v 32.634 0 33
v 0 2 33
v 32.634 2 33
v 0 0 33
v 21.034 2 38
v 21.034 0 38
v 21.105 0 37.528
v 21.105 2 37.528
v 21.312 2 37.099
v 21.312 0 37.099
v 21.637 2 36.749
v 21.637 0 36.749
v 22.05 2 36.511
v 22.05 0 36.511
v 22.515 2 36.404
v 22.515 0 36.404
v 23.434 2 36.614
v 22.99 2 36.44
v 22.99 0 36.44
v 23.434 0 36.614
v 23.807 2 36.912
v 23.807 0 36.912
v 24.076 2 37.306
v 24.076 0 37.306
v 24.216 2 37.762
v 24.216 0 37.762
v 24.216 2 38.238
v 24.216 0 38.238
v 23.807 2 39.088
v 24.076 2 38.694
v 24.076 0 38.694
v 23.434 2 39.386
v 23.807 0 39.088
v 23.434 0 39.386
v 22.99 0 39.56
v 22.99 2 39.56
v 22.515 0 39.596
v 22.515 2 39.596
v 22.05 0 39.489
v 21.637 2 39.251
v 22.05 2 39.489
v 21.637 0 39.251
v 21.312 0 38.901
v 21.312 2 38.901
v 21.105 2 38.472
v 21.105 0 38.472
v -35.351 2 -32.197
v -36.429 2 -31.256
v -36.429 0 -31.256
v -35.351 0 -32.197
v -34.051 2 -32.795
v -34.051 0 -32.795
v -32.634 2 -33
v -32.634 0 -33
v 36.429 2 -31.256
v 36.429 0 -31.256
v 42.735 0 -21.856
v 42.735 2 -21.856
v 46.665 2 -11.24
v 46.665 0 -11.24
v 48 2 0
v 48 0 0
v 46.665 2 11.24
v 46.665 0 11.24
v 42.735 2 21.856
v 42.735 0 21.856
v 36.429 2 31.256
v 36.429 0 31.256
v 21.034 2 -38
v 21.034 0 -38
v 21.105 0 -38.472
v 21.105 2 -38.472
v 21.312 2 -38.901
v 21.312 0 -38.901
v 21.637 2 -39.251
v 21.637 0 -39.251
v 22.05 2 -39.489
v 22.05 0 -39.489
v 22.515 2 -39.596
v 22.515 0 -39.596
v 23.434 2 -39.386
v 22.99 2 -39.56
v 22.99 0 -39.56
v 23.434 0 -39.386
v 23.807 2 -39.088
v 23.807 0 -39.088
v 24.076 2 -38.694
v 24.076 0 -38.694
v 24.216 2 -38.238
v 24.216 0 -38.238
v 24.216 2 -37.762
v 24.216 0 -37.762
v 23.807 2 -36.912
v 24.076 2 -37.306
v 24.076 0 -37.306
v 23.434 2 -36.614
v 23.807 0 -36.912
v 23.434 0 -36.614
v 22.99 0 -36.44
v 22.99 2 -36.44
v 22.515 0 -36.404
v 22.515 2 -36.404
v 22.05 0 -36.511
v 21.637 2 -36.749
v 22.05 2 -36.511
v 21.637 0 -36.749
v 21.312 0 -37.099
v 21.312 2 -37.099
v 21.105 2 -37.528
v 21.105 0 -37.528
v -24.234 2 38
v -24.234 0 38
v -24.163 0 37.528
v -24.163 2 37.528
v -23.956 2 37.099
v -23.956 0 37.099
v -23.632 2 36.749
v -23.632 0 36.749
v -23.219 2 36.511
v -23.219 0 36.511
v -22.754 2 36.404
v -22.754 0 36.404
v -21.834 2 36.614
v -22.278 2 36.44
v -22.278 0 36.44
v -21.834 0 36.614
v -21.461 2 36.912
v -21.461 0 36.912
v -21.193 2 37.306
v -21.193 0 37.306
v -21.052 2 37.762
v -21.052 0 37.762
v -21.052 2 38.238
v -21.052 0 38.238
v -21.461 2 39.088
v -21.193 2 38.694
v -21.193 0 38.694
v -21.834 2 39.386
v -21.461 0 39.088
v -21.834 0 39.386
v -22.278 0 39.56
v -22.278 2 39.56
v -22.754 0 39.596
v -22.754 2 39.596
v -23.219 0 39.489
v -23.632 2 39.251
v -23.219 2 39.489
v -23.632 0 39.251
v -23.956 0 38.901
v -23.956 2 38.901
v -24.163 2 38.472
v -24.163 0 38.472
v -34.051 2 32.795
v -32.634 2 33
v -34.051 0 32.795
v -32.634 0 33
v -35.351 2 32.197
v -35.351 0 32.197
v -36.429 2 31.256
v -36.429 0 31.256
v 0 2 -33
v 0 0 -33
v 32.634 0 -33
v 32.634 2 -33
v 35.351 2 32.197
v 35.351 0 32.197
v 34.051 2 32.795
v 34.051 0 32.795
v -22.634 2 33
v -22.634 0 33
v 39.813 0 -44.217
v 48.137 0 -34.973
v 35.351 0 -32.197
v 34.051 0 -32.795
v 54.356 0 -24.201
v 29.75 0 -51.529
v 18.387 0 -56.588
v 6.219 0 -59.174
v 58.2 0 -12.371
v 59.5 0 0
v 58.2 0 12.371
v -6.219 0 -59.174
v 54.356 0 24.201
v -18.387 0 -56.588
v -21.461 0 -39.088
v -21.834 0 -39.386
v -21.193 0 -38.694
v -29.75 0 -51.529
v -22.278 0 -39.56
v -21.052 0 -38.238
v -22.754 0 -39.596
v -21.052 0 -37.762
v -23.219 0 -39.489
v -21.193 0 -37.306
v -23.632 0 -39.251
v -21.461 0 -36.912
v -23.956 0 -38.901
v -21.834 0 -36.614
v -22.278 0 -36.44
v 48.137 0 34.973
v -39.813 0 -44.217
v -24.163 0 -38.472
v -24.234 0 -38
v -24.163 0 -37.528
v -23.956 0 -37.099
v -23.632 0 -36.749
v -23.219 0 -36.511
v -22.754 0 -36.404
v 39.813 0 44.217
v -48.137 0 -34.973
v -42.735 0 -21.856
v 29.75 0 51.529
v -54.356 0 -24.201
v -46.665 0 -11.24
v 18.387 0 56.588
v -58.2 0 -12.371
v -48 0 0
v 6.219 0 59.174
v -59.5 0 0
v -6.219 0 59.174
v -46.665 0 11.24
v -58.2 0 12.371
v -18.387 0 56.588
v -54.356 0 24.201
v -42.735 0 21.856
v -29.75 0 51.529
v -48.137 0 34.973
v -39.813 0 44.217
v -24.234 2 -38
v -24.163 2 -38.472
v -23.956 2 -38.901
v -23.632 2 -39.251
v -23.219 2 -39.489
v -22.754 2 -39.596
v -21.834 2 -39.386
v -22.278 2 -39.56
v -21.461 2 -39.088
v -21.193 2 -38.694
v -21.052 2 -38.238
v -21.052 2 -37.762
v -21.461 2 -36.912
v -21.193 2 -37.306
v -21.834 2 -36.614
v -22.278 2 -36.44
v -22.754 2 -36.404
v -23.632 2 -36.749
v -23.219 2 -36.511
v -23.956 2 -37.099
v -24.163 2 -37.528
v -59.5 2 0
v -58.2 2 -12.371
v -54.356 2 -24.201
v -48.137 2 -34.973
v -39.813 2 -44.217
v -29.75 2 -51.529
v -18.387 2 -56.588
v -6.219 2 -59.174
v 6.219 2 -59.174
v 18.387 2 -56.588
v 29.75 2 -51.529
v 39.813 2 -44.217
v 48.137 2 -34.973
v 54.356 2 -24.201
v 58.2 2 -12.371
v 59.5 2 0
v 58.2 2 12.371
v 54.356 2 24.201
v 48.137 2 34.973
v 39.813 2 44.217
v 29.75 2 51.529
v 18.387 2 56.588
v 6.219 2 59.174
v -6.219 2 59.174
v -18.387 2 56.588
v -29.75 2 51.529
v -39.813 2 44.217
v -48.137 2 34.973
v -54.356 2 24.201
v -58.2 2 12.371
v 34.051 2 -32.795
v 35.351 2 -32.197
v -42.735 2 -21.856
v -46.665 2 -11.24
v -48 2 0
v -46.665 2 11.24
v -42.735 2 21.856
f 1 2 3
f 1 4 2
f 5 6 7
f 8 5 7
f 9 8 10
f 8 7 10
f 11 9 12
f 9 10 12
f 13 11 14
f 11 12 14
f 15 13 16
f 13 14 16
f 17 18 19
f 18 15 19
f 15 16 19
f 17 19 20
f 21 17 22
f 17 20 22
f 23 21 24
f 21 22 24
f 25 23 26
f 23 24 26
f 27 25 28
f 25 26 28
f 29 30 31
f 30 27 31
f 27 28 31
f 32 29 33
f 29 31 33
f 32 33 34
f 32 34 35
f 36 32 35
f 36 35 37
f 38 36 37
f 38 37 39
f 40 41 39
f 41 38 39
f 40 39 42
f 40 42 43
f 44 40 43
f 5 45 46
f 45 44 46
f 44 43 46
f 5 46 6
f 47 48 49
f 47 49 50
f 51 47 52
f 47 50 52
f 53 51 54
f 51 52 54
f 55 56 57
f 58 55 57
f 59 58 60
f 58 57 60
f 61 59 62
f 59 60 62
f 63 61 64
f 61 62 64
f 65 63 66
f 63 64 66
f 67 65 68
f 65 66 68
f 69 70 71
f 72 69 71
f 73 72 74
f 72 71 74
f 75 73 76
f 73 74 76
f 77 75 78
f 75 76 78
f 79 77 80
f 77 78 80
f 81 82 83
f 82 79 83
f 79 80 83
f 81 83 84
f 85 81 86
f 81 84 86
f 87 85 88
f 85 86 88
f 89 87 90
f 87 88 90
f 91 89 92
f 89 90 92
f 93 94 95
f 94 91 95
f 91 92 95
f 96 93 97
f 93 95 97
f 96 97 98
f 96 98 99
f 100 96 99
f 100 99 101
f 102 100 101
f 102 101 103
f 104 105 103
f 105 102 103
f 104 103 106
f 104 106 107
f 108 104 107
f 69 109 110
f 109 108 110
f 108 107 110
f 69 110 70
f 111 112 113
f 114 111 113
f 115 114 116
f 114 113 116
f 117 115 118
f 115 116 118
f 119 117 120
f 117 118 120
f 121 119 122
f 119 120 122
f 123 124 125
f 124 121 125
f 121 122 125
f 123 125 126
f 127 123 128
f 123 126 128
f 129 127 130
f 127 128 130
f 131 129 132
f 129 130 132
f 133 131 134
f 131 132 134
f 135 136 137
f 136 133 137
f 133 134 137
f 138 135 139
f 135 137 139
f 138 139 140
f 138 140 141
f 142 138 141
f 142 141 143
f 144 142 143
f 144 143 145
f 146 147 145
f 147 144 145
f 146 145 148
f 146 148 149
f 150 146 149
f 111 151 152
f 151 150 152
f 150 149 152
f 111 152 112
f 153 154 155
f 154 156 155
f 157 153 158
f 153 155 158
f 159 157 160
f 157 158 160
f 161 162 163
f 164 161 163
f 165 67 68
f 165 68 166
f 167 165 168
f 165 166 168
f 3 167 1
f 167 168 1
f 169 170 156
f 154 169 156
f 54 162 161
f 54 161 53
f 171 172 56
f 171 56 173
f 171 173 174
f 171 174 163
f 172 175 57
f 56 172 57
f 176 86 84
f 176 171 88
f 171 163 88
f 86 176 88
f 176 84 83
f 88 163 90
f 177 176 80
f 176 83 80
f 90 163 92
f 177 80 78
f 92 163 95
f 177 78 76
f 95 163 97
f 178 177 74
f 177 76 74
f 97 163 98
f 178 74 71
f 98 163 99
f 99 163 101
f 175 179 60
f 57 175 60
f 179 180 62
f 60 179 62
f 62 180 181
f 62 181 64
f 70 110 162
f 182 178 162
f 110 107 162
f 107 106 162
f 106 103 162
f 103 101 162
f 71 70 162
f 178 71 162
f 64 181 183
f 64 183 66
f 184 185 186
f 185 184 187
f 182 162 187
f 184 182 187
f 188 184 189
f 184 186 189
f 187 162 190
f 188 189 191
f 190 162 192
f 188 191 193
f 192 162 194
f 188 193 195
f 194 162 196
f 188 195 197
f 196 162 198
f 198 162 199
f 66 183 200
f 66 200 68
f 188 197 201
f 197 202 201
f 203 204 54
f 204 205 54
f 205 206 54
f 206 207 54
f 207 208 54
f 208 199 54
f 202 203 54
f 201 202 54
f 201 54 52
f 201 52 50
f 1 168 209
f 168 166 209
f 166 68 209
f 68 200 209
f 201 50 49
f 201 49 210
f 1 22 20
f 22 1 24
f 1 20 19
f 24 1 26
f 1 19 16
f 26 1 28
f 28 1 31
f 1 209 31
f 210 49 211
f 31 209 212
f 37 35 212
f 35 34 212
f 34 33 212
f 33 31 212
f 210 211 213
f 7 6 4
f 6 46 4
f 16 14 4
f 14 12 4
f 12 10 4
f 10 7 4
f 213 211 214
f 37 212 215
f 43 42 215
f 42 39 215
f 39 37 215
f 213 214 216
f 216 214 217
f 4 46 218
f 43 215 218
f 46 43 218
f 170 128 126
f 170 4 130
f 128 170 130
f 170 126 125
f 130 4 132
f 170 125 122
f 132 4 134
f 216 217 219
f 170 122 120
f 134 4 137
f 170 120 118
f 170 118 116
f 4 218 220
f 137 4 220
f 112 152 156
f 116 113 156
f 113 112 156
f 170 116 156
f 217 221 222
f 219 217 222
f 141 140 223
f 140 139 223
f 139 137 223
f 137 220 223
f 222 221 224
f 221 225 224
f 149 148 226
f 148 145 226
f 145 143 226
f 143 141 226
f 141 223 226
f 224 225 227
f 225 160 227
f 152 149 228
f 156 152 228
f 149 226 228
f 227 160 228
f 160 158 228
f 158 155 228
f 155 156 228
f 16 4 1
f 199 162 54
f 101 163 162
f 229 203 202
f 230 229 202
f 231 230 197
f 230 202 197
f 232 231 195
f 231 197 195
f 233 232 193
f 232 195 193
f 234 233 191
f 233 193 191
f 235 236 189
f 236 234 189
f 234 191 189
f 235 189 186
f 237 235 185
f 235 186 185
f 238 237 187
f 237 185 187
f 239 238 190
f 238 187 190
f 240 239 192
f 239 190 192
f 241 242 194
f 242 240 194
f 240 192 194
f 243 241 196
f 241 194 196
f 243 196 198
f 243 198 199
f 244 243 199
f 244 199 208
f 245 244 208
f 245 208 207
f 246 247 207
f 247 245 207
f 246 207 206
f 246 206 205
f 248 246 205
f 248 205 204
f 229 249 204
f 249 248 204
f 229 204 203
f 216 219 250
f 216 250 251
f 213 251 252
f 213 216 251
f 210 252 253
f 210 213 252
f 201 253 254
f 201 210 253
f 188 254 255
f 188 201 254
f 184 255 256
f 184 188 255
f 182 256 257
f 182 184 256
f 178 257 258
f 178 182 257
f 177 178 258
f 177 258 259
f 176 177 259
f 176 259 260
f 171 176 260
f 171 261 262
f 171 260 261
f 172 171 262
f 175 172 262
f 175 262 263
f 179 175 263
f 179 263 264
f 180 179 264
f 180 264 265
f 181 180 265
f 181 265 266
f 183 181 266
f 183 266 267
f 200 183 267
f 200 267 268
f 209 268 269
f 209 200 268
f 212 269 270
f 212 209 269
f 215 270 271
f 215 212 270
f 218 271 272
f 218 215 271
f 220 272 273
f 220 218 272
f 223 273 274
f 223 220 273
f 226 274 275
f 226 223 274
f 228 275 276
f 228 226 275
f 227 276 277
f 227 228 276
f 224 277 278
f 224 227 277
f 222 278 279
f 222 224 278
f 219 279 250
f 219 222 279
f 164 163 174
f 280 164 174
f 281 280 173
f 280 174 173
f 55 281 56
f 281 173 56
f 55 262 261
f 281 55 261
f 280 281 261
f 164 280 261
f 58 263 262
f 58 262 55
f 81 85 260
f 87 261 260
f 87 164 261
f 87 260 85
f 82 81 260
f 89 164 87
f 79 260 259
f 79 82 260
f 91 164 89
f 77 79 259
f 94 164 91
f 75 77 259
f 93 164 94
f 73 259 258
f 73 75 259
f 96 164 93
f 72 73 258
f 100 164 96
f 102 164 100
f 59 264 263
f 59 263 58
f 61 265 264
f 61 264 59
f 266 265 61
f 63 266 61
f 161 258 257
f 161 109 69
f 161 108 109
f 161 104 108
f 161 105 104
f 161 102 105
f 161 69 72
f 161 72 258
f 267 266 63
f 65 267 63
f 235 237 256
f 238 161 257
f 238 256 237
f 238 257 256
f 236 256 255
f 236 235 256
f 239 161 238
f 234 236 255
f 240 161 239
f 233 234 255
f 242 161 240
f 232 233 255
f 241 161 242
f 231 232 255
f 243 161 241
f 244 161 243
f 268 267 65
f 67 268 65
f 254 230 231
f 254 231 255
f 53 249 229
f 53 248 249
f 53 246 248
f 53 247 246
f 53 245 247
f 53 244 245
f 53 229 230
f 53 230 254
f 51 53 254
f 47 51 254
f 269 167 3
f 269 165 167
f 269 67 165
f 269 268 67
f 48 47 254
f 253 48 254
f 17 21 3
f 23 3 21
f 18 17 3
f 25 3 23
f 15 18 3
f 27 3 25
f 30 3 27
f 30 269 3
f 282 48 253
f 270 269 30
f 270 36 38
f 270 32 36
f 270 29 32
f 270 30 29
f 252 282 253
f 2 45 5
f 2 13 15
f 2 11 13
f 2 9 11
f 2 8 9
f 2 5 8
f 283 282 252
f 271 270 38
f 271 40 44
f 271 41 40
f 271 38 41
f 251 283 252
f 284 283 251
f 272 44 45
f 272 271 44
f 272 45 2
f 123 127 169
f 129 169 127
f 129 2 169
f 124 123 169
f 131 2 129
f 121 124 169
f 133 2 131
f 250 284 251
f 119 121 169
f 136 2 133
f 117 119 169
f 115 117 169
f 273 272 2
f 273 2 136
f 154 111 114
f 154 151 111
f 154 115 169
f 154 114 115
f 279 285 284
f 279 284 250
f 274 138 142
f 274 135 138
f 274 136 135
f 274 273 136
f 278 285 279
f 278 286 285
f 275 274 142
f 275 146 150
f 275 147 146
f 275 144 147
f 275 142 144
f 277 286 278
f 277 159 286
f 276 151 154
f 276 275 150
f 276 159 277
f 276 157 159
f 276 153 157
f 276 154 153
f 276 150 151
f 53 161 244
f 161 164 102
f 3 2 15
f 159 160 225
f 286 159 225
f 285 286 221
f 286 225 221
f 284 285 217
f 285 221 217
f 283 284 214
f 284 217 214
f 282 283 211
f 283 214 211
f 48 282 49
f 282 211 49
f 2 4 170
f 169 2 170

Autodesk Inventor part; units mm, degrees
ref_plane "YZ Plane" through (0, 0, 0) normal (1, 0, 0) x (0, 1, 0)
ref_plane "XZ Plane" through (0, 0, 0) normal (0, 1, 0) x (-1, 0, 0)
ref_plane "XY Plane" through (0, 0, 0) normal (0, 0, 1) x (1, 0, 0)
sketch "Sketch1" plane through (0, 0, 0) normal (0, 1, 0) x (-1, 0, 0)
  circle A0 centre (0, 0) radius 59.5
  line L0 (0, 33) -> (-32.6343, 33)
  line L1 (0, 33) -> (32.6343, 33)
  line L2 (0, -33) -> (-32.6343, -33)
  line L3 (0, -33) -> (32.6343, -33)
  arc A1 (-36.429, 31.2558) -> (-36.429, -31.2558) centre (0, 0) ccw
  arc A2 (36.429, -31.2558) -> (36.429, 31.2558) centre (0, 0) ccw
  arc A3 (36.429, 31.2558) -> (32.6343, 33) centre (32.6343, 28) ccw
  arc A4 (-32.6343, 33) -> (-36.429, 31.2558) centre (-32.6343, 28) ccw
  arc A5 (-36.429, -31.2558) -> (-32.6343, -33) centre (-32.6343, -28) ccw
  arc A6 (32.6343, -33) -> (36.429, -31.2558) centre (32.6343, -28) ccw
  line L4 (32.6343, 33) -> (22.6343, 33)
  circle A7 centre (22.6343, 38) radius 1.6
  line L5 (0, 0) -> (0, 10.7969)
  line L6 (0, 0) -> (10.7386, 0)
  circle A8 centre (-22.6343, 38) radius 1.6
  circle A9 centre (22.6343, -38) radius 1.6
  circle A10 centre (-22.6343, -38) radius 1.6
  point P0 (-34.8569, 33)
  point P1 (34.8569, 33)
  point P2 (-34.8569, -33)
  point P3 (34.8569, -33)
  dimension "d1" = 119
  dimension "d7" = 5
  dimension "d8" = 10
  dimension "d11" = 3.2
extrude "Extrusion1" add sketch "Sketch1" along normal blind 2
sketch "Sketch2" plane through (0, 0, 0) normal (0, -1, 0) x (1, 0, 0)
  line L0 (1.5, -53.75) -> (1.5, -56.75)
  line L1 (1.5, -56.75) -> (4.5, -56.75)
  line L2 (4.5, -56.75) -> (4.5, -50.75)
  line L3 (4.5, -50.75) -> (1.5, -50.75)
  line L4 (1.5, -50.75) -> (1.5, -53.75)
  line L5 (-1.5, -53.75) -> (-1.5, -56.75)
  line L6 (-1.5, -56.75) -> (-4.5, -56.75)
  line L7 (-1.5, -53.75) -> (-1.5, -53.75)
  line L8 (-1.5, -53.75) -> (-1.5, -50.75)
  line L9 (-1.5, -50.75) -> (-4.5, -50.75)
  line L10 (-4.5, -56.75) -> (-4.5, -50.75)
  line L11 (17.4817, -47.856) -> (14.584, -48.6325)
  line L12 (11.6862, -49.409) -> (8.7884, -50.1854)
  line L13 (12.4626, -52.3067) -> (11.6862, -49.409)
  line L14 (10.3413, -55.981) -> (8.7884, -50.1854)
  line L15 (14.584, -48.6325) -> (15.3604, -51.5303)
  line L16 (19.0346, -53.6516) -> (17.4817, -47.856)
  line L17 (16.1369, -54.4281) -> (19.0346, -53.6516)
  line L18 (15.3604, -51.5303) -> (16.1369, -54.4281)
  line L19 (12.4626, -52.3067) -> (13.2391, -55.2045)
  line L20 (13.2391, -55.2045) -> (10.3413, -55.981)
  line L21 (29.2721, -41.7008) -> (26.674, -43.2008)
  line L22 (24.076, -44.7008) -> (21.4779, -46.2008)
  line L23 (25.576, -47.2989) -> (24.076, -44.7008)
  line L24 (24.4779, -51.3969) -> (21.4779, -46.2008)
  line L25 (26.674, -43.2008) -> (28.174, -45.7989)
  line L26 (32.2721, -46.8969) -> (29.2721, -41.7008)
  line L27 (29.674, -48.3969) -> (32.2721, -46.8969)
  line L28 (28.174, -45.7989) -> (29.674, -48.3969)
  line L29 (25.576, -47.2989) -> (27.076, -49.8969)
  line L30 (27.076, -49.8969) -> (24.4779, -51.3969)
  line L31 (39.0676, -32.7037) -> (36.9463, -34.825)
  line L32 (34.825, -36.9463) -> (32.7037, -39.0676)
  line L33 (36.9463, -39.0676) -> (34.825, -36.9463)
  line L34 (36.9463, -43.3103) -> (32.7037, -39.0676)
  line L35 (36.9463, -34.825) -> (39.0676, -36.9463)
  line L36 (43.3103, -36.9463) -> (39.0676, -32.7037)
  line L37 (41.189, -39.0676) -> (43.3103, -36.9463)
  line L38 (39.0676, -36.9463) -> (41.189, -39.0676)
  line L39 (36.9463, -39.0676) -> (39.0676, -41.189)
  line L40 (39.0676, -41.189) -> (36.9463, -43.3103)
  line L41 (46.2008, -21.4779) -> (44.7008, -24.076)
  line L42 (43.2008, -26.674) -> (41.7008, -29.2721)
  line L43 (45.7989, -28.174) -> (43.2008, -26.674)
  line L44 (46.8969, -32.2721) -> (41.7008, -29.2721)
  line L45 (44.7008, -24.076) -> (47.2989, -25.576)
  line L46 (51.3969, -24.4779) -> (46.2008, -21.4779)
  line L47 (49.8969, -27.076) -> (51.3969, -24.4779)
  line L48 (47.2989, -25.576) -> (49.8969, -27.076)
  line L49 (45.7989, -28.174) -> (48.3969, -29.674)
  line L50 (48.3969, -29.674) -> (46.8969, -32.2721)
  line L51 (50.1854, -8.7884) -> (49.409, -11.6862)
  line L52 (48.6325, -14.584) -> (47.856, -17.4817)
  line L53 (51.5303, -15.3604) -> (48.6325, -14.584)
  line L54 (53.6516, -19.0346) -> (47.856, -17.4817)
  line L55 (49.409, -11.6862) -> (52.3067, -12.4626)
  line L56 (55.981, -10.3413) -> (50.1854, -8.7884)
  line L57 (55.2045, -13.2391) -> (55.981, -10.3413)
  line L58 (52.3067, -12.4626) -> (55.2045, -13.2391)
  line L59 (51.5303, -15.3604) -> (54.4281, -16.1369)
  line L60 (54.4281, -16.1369) -> (53.6516, -19.0346)
  line L61 (50.75, 4.5) -> (50.75, 1.5)
  line L62 (50.75, -1.5) -> (50.75, -4.5)
  line L63 (53.75, -1.5) -> (50.75, -1.5)
  line L64 (56.75, -4.5) -> (50.75, -4.5)
  line L65 (50.75, 1.5) -> (53.75, 1.5)
  line L66 (56.75, 4.5) -> (50.75, 4.5)
  line L67 (56.75, 1.5) -> (56.75, 4.5)
  line L68 (53.75, 1.5) -> (56.75, 1.5)
  line L69 (53.75, -1.5) -> (56.75, -1.5)
  line L70 (56.75, -1.5) -> (56.75, -4.5)
  line L71 (47.856, 17.4817) -> (48.6325, 14.584)
  line L72 (49.409, 11.6862) -> (50.1854, 8.7884)
  line L73 (52.3067, 12.4626) -> (49.409, 11.6862)
  line L74 (55.981, 10.3413) -> (50.1854, 8.7884)
  line L75 (48.6325, 14.584) -> (51.5303, 15.3604)
  line L76 (53.6516, 19.0346) -> (47.856, 17.4817)
  line L77 (54.4281, 16.1369) -> (53.6516, 19.0346)
  line L78 (51.5303, 15.3604) -> (54.4281, 16.1369)
  line L79 (52.3067, 12.4626) -> (55.2045, 13.2391)
  line L80 (55.2045, 13.2391) -> (55.981, 10.3413)
  line L81 (41.7008, 29.2721) -> (43.2008, 26.674)
  line L82 (44.7008, 24.076) -> (46.2008, 21.4779)
  line L83 (47.2989, 25.576) -> (44.7008, 24.076)
  line L84 (51.3969, 24.4779) -> (46.2008, 21.4779)
  line L85 (43.2008, 26.674) -> (45.7989, 28.174)
  line L86 (46.8969, 32.2721) -> (41.7008, 29.2721)
  line L87 (48.3969, 29.674) -> (46.8969, 32.2721)
  line L88 (45.7989, 28.174) -> (48.3969, 29.674)
  line L89 (47.2989, 25.576) -> (49.8969, 27.076)
  line L90 (49.8969, 27.076) -> (51.3969, 24.4779)
  line L91 (32.7037, 39.0676) -> (34.825, 36.9463)
  line L92 (36.9463, 34.825) -> (39.0676, 32.7037)
  line L93 (39.0676, 36.9463) -> (36.9463, 34.825)
  line L94 (43.3103, 36.9463) -> (39.0676, 32.7037)
  line L95 (34.825, 36.9463) -> (36.9463, 39.0676)
  line L96 (36.9463, 43.3103) -> (32.7037, 39.0676)
  line L97 (39.0676, 41.189) -> (36.9463, 43.3103)
  line L98 (36.9463, 39.0676) -> (39.0676, 41.189)
  line L99 (39.0676, 36.9463) -> (41.189, 39.0676)
  line L100 (41.189, 39.0676) -> (43.3103, 36.9463)
  line L101 (21.4779, 46.2008) -> (24.076, 44.7008)
  line L102 (26.674, 43.2008) -> (29.2721, 41.7008)
  line L103 (28.174, 45.7989) -> (26.674, 43.2008)
  line L104 (32.2721, 46.8969) -> (29.2721, 41.7008)
  line L105 (24.076, 44.7008) -> (25.576, 47.2989)
  line L106 (24.4779, 51.3969) -> (21.4779, 46.2008)
  line L107 (27.076, 49.8969) -> (24.4779, 51.3969)
  line L108 (25.576, 47.2989) -> (27.076, 49.8969)
  line L109 (28.174, 45.7989) -> (29.674, 48.3969)
  line L110 (29.674, 48.3969) -> (32.2721, 46.8969)
  line L111 (8.7884, 50.1854) -> (11.6862, 49.409)
  line L112 (14.584, 48.6325) -> (17.4817, 47.856)
  line L113 (15.3604, 51.5303) -> (14.584, 48.6325)
  line L114 (19.0346, 53.6516) -> (17.4817, 47.856)
  line L115 (11.6862, 49.409) -> (12.4626, 52.3067)
  line L116 (10.3413, 55.981) -> (8.7884, 50.1854)
  line L117 (13.2391, 55.2045) -> (10.3413, 55.981)
  line L118 (12.4626, 52.3067) -> (13.2391, 55.2045)
  line L119 (15.3604, 51.5303) -> (16.1369, 54.4281)
  line L120 (16.1369, 54.4281) -> (19.0346, 53.6516)
  line L121 (-4.5, 50.75) -> (-1.5, 50.75)
  line L122 (1.5, 50.75) -> (4.5, 50.75)
  line L123 (1.5, 53.75) -> (1.5, 50.75)
  line L124 (4.5, 56.75) -> (4.5, 50.75)
  line L125 (-1.5, 50.75) -> (-1.5, 53.75)
  line L126 (-4.5, 56.75) -> (-4.5, 50.75)
  line L127 (-1.5, 56.75) -> (-4.5, 56.75)
  line L128 (-1.5, 53.75) -> (-1.5, 56.75)
  line L129 (1.5, 53.75) -> (1.5, 56.75)
  line L130 (1.5, 56.75) -> (4.5, 56.75)
  line L131 (-17.4817, 47.856) -> (-14.584, 48.6325)
  line L132 (-11.6862, 49.409) -> (-8.7884, 50.1854)
  line L133 (-12.4626, 52.3067) -> (-11.6862, 49.409)
  line L134 (-10.3413, 55.981) -> (-8.7884, 50.1854)
  line L135 (-14.584, 48.6325) -> (-15.3604, 51.5303)
  line L136 (-19.0346, 53.6516) -> (-17.4817, 47.856)
  line L137 (-16.1369, 54.4281) -> (-19.0346, 53.6516)
  line L138 (-15.3604, 51.5303) -> (-16.1369, 54.4281)
  line L139 (-12.4626, 52.3067) -> (-13.2391, 55.2045)
  line L140 (-13.2391, 55.2045) -> (-10.3413, 55.981)
  line L141 (-29.2721, 41.7008) -> (-26.674, 43.2008)
  line L142 (-24.076, 44.7008) -> (-21.4779, 46.2008)
  line L143 (-25.576, 47.2989) -> (-24.076, 44.7008)
  line L144 (-24.4779, 51.3969) -> (-21.4779, 46.2008)
  line L145 (-26.674, 43.2008) -> (-28.174, 45.7989)
  line L146 (-32.2721, 46.8969) -> (-29.2721, 41.7008)
  line L147 (-29.674, 48.3969) -> (-32.2721, 46.8969)
  line L148 (-28.174, 45.7989) -> (-29.674, 48.3969)
  line L149 (-25.576, 47.2989) -> (-27.076, 49.8969)
  line L150 (-27.076, 49.8969) -> (-24.4779, 51.3969)
  line L151 (-39.0676, 32.7037) -> (-36.9463, 34.825)
  line L152 (-34.825, 36.9463) -> (-32.7037, 39.0676)
  line L153 (-36.9463, 39.0676) -> (-34.825, 36.9463)
  line L154 (-36.9463, 43.3103) -> (-32.7037, 39.0676)
  line L155 (-36.9463, 34.825) -> (-39.0676, 36.9463)
  line L156 (-43.3103, 36.9463) -> (-39.0676, 32.7037)
  line L157 (-41.189, 39.0676) -> (-43.3103, 36.9463)
  line L158 (-39.0676, 36.9463) -> (-41.189, 39.0676)
  line L159 (-36.9463, 39.0676) -> (-39.0676, 41.189)
  line L160 (-39.0676, 41.189) -> (-36.9463, 43.3103)
  line L161 (-46.2008, 21.4779) -> (-44.7008, 24.076)
  line L162 (-43.2008, 26.674) -> (-41.7008, 29.2721)
  line L163 (-45.7989, 28.174) -> (-43.2008, 26.674)
  line L164 (-46.8969, 32.2721) -> (-41.7008, 29.2721)
  line L165 (-44.7008, 24.076) -> (-47.2989, 25.576)
  line L166 (-51.3969, 24.4779) -> (-46.2008, 21.4779)
  line L167 (-49.8969, 27.076) -> (-51.3969, 24.4779)
  line L168 (-47.2989, 25.576) -> (-49.8969, 27.076)
  line L169 (-45.7989, 28.174) -> (-48.3969, 29.674)
  line L170 (-48.3969, 29.674) -> (-46.8969, 32.2721)
  line L171 (-50.1854, 8.7884) -> (-49.409, 11.6862)
  line L172 (-48.6325, 14.584) -> (-47.856, 17.4817)
  line L173 (-51.5303, 15.3604) -> (-48.6325, 14.584)
  line L174 (-53.6516, 19.0346) -> (-47.856, 17.4817)
  line L175 (-49.409, 11.6862) -> (-52.3067, 12.4626)
  line L176 (-55.981, 10.3413) -> (-50.1854, 8.7884)
  line L177 (-55.2045, 13.2391) -> (-55.981, 10.3413)
  line L178 (-52.3067, 12.4626) -> (-55.2045, 13.2391)
  line L179 (-51.5303, 15.3604) -> (-54.4281, 16.1369)
  line L180 (-54.4281, 16.1369) -> (-53.6516, 19.0346)
  line L181 (-50.75, -4.5) -> (-50.75, -1.5)
  line L182 (-50.75, 1.5) -> (-50.75, 4.5)
  line L183 (-53.75, 1.5) -> (-50.75, 1.5)
  line L184 (-56.75, 4.5) -> (-50.75, 4.5)
  line L185 (-50.75, -1.5) -> (-53.75, -1.5)
  line L186 (-56.75, -4.5) -> (-50.75, -4.5)
  line L187 (-56.75, -1.5) -> (-56.75, -4.5)
  line L188 (-53.75, -1.5) -> (-56.75, -1.5)
  line L189 (-53.75, 1.5) -> (-56.75, 1.5)
  line L190 (-56.75, 1.5) -> (-56.75, 4.5)
  line L191 (-47.856, -17.4817) -> (-48.6325, -14.584)
  line L192 (-49.409, -11.6862) -> (-50.1854, -8.7884)
  line L193 (-52.3067, -12.4626) -> (-49.409, -11.6862)
  line L194 (-55.981, -10.3413) -> (-50.1854, -8.7884)
  line L195 (-48.6325, -14.584) -> (-51.5303, -15.3604)
  line L196 (-53.6516, -19.0346) -> (-47.856, -17.4817)
  line L197 (-54.4281, -16.1369) -> (-53.6516, -19.0346)
  line L198 (-51.5303, -15.3604) -> (-54.4281, -16.1369)
  line L199 (-52.3067, -12.4626) -> (-55.2045, -13.2391)
  line L200 (-55.2045, -13.2391) -> (-55.981, -10.3413)
  line L201 (-41.7008, -29.2721) -> (-43.2008, -26.674)
  line L202 (-44.7008, -24.076) -> (-46.2008, -21.4779)
  line L203 (-47.2989, -25.576) -> (-44.7008, -24.076)
  line L204 (-51.3969, -24.4779) -> (-46.2008, -21.4779)
  line L205 (-43.2008, -26.674) -> (-45.7989, -28.174)
  line L206 (-46.8969, -32.2721) -> (-41.7008, -29.2721)
  line L207 (-48.3969, -29.674) -> (-46.8969, -32.2721)
  line L208 (-45.7989, -28.174) -> (-48.3969, -29.674)
  line L209 (-47.2989, -25.576) -> (-49.8969, -27.076)
  line L210 (-49.8969, -27.076) -> (-51.3969, -24.4779)
  line L211 (-32.7037, -39.0676) -> (-34.825, -36.9463)
  line L212 (-36.9463, -34.825) -> (-39.0676, -32.7037)
  line L213 (-39.0676, -36.9463) -> (-36.9463, -34.825)
  line L214 (-43.3103, -36.9463) -> (-39.0676, -32.7037)
  line L215 (-34.825, -36.9463) -> (-36.9463, -39.0676)
  line L216 (-36.9463, -43.3103) -> (-32.7037, -39.0676)
  line L217 (-39.0676, -41.189) -> (-36.9463, -43.3103)
  line L218 (-36.9463, -39.0676) -> (-39.0676, -41.189)
  line L219 (-39.0676, -36.9463) -> (-41.189, -39.0676)
  line L220 (-41.189, -39.0676) -> (-43.3103, -36.9463)
  line L221 (-21.4779, -46.2008) -> (-24.076, -44.7008)
  line L222 (-26.674, -43.2008) -> (-29.2721, -41.7008)
  line L223 (-28.174, -45.7989) -> (-26.674, -43.2008)
  line L224 (-32.2721, -46.8969) -> (-29.2721, -41.7008)
  line L225 (-24.076, -44.7008) -> (-25.576, -47.2989)
  line L226 (-24.4779, -51.3969) -> (-21.4779, -46.2008)
  line L227 (-27.076, -49.8969) -> (-24.4779, -51.3969)
  line L228 (-25.576, -47.2989) -> (-27.076, -49.8969)
  line L229 (-28.174, -45.7989) -> (-29.674, -48.3969)
  line L230 (-29.674, -48.3969) -> (-32.2721, -46.8969)
  line L231 (-8.7884, -50.1854) -> (-11.6862, -49.409)
  line L232 (-14.584, -48.6325) -> (-17.4817, -47.856)
  line L233 (-15.3604, -51.5303) -> (-14.584, -48.6325)
  line L234 (-19.0346, -53.6516) -> (-17.4817, -47.856)
  line L235 (-11.6862, -49.409) -> (-12.4626, -52.3067)
  line L236 (-10.3413, -55.981) -> (-8.7884, -50.1854)
  line L237 (-13.2391, -55.2045) -> (-10.3413, -55.981)
  line L238 (-12.4626, -52.3067) -> (-13.2391, -55.2045)
  line L239 (-15.3604, -51.5303) -> (-16.1369, -54.4281)
  line L240 (-16.1369, -54.4281) -> (-19.0346, -53.6516)
  line L241 (-32.6343, 33) -> (32.6343, 33) projected
  arc A0 (36.429, 31.2558) -> (32.6343, 33) centre (32.6343, 28) ccw projected
  arc A1 (36.429, -31.2558) -> (36.429, 31.2558) centre (0, 0) ccw projected
  arc A2 (32.6343, -33) -> (36.429, -31.2558) centre (32.6343, -28) ccw projected
  line L242 (32.6343, -33) -> (-32.6343, -33) projected
  arc A3 (-36.429, -31.2558) -> (-32.6343, -33) centre (-32.6343, -28) ccw projected
  arc A4 (-36.429, 31.2558) -> (-36.429, -31.2558) centre (0, 0) ccw projected
  arc A5 (-32.6343, 33) -> (-36.429, 31.2558) centre (-32.6343, 28) ccw projected
  circle A6 centre (-22.6343, -38) radius 1.6 projected
  circle A7 centre (22.6343, -38) radius 1.6 projected
  circle A8 centre (22.6343, 38) radius 1.6 projected
  circle A9 centre (-22.6343, 38) radius 1.6 projected
  circle A10 centre (0, 0) radius 59.5 projected
properties part number "Light Sensor PCB"
